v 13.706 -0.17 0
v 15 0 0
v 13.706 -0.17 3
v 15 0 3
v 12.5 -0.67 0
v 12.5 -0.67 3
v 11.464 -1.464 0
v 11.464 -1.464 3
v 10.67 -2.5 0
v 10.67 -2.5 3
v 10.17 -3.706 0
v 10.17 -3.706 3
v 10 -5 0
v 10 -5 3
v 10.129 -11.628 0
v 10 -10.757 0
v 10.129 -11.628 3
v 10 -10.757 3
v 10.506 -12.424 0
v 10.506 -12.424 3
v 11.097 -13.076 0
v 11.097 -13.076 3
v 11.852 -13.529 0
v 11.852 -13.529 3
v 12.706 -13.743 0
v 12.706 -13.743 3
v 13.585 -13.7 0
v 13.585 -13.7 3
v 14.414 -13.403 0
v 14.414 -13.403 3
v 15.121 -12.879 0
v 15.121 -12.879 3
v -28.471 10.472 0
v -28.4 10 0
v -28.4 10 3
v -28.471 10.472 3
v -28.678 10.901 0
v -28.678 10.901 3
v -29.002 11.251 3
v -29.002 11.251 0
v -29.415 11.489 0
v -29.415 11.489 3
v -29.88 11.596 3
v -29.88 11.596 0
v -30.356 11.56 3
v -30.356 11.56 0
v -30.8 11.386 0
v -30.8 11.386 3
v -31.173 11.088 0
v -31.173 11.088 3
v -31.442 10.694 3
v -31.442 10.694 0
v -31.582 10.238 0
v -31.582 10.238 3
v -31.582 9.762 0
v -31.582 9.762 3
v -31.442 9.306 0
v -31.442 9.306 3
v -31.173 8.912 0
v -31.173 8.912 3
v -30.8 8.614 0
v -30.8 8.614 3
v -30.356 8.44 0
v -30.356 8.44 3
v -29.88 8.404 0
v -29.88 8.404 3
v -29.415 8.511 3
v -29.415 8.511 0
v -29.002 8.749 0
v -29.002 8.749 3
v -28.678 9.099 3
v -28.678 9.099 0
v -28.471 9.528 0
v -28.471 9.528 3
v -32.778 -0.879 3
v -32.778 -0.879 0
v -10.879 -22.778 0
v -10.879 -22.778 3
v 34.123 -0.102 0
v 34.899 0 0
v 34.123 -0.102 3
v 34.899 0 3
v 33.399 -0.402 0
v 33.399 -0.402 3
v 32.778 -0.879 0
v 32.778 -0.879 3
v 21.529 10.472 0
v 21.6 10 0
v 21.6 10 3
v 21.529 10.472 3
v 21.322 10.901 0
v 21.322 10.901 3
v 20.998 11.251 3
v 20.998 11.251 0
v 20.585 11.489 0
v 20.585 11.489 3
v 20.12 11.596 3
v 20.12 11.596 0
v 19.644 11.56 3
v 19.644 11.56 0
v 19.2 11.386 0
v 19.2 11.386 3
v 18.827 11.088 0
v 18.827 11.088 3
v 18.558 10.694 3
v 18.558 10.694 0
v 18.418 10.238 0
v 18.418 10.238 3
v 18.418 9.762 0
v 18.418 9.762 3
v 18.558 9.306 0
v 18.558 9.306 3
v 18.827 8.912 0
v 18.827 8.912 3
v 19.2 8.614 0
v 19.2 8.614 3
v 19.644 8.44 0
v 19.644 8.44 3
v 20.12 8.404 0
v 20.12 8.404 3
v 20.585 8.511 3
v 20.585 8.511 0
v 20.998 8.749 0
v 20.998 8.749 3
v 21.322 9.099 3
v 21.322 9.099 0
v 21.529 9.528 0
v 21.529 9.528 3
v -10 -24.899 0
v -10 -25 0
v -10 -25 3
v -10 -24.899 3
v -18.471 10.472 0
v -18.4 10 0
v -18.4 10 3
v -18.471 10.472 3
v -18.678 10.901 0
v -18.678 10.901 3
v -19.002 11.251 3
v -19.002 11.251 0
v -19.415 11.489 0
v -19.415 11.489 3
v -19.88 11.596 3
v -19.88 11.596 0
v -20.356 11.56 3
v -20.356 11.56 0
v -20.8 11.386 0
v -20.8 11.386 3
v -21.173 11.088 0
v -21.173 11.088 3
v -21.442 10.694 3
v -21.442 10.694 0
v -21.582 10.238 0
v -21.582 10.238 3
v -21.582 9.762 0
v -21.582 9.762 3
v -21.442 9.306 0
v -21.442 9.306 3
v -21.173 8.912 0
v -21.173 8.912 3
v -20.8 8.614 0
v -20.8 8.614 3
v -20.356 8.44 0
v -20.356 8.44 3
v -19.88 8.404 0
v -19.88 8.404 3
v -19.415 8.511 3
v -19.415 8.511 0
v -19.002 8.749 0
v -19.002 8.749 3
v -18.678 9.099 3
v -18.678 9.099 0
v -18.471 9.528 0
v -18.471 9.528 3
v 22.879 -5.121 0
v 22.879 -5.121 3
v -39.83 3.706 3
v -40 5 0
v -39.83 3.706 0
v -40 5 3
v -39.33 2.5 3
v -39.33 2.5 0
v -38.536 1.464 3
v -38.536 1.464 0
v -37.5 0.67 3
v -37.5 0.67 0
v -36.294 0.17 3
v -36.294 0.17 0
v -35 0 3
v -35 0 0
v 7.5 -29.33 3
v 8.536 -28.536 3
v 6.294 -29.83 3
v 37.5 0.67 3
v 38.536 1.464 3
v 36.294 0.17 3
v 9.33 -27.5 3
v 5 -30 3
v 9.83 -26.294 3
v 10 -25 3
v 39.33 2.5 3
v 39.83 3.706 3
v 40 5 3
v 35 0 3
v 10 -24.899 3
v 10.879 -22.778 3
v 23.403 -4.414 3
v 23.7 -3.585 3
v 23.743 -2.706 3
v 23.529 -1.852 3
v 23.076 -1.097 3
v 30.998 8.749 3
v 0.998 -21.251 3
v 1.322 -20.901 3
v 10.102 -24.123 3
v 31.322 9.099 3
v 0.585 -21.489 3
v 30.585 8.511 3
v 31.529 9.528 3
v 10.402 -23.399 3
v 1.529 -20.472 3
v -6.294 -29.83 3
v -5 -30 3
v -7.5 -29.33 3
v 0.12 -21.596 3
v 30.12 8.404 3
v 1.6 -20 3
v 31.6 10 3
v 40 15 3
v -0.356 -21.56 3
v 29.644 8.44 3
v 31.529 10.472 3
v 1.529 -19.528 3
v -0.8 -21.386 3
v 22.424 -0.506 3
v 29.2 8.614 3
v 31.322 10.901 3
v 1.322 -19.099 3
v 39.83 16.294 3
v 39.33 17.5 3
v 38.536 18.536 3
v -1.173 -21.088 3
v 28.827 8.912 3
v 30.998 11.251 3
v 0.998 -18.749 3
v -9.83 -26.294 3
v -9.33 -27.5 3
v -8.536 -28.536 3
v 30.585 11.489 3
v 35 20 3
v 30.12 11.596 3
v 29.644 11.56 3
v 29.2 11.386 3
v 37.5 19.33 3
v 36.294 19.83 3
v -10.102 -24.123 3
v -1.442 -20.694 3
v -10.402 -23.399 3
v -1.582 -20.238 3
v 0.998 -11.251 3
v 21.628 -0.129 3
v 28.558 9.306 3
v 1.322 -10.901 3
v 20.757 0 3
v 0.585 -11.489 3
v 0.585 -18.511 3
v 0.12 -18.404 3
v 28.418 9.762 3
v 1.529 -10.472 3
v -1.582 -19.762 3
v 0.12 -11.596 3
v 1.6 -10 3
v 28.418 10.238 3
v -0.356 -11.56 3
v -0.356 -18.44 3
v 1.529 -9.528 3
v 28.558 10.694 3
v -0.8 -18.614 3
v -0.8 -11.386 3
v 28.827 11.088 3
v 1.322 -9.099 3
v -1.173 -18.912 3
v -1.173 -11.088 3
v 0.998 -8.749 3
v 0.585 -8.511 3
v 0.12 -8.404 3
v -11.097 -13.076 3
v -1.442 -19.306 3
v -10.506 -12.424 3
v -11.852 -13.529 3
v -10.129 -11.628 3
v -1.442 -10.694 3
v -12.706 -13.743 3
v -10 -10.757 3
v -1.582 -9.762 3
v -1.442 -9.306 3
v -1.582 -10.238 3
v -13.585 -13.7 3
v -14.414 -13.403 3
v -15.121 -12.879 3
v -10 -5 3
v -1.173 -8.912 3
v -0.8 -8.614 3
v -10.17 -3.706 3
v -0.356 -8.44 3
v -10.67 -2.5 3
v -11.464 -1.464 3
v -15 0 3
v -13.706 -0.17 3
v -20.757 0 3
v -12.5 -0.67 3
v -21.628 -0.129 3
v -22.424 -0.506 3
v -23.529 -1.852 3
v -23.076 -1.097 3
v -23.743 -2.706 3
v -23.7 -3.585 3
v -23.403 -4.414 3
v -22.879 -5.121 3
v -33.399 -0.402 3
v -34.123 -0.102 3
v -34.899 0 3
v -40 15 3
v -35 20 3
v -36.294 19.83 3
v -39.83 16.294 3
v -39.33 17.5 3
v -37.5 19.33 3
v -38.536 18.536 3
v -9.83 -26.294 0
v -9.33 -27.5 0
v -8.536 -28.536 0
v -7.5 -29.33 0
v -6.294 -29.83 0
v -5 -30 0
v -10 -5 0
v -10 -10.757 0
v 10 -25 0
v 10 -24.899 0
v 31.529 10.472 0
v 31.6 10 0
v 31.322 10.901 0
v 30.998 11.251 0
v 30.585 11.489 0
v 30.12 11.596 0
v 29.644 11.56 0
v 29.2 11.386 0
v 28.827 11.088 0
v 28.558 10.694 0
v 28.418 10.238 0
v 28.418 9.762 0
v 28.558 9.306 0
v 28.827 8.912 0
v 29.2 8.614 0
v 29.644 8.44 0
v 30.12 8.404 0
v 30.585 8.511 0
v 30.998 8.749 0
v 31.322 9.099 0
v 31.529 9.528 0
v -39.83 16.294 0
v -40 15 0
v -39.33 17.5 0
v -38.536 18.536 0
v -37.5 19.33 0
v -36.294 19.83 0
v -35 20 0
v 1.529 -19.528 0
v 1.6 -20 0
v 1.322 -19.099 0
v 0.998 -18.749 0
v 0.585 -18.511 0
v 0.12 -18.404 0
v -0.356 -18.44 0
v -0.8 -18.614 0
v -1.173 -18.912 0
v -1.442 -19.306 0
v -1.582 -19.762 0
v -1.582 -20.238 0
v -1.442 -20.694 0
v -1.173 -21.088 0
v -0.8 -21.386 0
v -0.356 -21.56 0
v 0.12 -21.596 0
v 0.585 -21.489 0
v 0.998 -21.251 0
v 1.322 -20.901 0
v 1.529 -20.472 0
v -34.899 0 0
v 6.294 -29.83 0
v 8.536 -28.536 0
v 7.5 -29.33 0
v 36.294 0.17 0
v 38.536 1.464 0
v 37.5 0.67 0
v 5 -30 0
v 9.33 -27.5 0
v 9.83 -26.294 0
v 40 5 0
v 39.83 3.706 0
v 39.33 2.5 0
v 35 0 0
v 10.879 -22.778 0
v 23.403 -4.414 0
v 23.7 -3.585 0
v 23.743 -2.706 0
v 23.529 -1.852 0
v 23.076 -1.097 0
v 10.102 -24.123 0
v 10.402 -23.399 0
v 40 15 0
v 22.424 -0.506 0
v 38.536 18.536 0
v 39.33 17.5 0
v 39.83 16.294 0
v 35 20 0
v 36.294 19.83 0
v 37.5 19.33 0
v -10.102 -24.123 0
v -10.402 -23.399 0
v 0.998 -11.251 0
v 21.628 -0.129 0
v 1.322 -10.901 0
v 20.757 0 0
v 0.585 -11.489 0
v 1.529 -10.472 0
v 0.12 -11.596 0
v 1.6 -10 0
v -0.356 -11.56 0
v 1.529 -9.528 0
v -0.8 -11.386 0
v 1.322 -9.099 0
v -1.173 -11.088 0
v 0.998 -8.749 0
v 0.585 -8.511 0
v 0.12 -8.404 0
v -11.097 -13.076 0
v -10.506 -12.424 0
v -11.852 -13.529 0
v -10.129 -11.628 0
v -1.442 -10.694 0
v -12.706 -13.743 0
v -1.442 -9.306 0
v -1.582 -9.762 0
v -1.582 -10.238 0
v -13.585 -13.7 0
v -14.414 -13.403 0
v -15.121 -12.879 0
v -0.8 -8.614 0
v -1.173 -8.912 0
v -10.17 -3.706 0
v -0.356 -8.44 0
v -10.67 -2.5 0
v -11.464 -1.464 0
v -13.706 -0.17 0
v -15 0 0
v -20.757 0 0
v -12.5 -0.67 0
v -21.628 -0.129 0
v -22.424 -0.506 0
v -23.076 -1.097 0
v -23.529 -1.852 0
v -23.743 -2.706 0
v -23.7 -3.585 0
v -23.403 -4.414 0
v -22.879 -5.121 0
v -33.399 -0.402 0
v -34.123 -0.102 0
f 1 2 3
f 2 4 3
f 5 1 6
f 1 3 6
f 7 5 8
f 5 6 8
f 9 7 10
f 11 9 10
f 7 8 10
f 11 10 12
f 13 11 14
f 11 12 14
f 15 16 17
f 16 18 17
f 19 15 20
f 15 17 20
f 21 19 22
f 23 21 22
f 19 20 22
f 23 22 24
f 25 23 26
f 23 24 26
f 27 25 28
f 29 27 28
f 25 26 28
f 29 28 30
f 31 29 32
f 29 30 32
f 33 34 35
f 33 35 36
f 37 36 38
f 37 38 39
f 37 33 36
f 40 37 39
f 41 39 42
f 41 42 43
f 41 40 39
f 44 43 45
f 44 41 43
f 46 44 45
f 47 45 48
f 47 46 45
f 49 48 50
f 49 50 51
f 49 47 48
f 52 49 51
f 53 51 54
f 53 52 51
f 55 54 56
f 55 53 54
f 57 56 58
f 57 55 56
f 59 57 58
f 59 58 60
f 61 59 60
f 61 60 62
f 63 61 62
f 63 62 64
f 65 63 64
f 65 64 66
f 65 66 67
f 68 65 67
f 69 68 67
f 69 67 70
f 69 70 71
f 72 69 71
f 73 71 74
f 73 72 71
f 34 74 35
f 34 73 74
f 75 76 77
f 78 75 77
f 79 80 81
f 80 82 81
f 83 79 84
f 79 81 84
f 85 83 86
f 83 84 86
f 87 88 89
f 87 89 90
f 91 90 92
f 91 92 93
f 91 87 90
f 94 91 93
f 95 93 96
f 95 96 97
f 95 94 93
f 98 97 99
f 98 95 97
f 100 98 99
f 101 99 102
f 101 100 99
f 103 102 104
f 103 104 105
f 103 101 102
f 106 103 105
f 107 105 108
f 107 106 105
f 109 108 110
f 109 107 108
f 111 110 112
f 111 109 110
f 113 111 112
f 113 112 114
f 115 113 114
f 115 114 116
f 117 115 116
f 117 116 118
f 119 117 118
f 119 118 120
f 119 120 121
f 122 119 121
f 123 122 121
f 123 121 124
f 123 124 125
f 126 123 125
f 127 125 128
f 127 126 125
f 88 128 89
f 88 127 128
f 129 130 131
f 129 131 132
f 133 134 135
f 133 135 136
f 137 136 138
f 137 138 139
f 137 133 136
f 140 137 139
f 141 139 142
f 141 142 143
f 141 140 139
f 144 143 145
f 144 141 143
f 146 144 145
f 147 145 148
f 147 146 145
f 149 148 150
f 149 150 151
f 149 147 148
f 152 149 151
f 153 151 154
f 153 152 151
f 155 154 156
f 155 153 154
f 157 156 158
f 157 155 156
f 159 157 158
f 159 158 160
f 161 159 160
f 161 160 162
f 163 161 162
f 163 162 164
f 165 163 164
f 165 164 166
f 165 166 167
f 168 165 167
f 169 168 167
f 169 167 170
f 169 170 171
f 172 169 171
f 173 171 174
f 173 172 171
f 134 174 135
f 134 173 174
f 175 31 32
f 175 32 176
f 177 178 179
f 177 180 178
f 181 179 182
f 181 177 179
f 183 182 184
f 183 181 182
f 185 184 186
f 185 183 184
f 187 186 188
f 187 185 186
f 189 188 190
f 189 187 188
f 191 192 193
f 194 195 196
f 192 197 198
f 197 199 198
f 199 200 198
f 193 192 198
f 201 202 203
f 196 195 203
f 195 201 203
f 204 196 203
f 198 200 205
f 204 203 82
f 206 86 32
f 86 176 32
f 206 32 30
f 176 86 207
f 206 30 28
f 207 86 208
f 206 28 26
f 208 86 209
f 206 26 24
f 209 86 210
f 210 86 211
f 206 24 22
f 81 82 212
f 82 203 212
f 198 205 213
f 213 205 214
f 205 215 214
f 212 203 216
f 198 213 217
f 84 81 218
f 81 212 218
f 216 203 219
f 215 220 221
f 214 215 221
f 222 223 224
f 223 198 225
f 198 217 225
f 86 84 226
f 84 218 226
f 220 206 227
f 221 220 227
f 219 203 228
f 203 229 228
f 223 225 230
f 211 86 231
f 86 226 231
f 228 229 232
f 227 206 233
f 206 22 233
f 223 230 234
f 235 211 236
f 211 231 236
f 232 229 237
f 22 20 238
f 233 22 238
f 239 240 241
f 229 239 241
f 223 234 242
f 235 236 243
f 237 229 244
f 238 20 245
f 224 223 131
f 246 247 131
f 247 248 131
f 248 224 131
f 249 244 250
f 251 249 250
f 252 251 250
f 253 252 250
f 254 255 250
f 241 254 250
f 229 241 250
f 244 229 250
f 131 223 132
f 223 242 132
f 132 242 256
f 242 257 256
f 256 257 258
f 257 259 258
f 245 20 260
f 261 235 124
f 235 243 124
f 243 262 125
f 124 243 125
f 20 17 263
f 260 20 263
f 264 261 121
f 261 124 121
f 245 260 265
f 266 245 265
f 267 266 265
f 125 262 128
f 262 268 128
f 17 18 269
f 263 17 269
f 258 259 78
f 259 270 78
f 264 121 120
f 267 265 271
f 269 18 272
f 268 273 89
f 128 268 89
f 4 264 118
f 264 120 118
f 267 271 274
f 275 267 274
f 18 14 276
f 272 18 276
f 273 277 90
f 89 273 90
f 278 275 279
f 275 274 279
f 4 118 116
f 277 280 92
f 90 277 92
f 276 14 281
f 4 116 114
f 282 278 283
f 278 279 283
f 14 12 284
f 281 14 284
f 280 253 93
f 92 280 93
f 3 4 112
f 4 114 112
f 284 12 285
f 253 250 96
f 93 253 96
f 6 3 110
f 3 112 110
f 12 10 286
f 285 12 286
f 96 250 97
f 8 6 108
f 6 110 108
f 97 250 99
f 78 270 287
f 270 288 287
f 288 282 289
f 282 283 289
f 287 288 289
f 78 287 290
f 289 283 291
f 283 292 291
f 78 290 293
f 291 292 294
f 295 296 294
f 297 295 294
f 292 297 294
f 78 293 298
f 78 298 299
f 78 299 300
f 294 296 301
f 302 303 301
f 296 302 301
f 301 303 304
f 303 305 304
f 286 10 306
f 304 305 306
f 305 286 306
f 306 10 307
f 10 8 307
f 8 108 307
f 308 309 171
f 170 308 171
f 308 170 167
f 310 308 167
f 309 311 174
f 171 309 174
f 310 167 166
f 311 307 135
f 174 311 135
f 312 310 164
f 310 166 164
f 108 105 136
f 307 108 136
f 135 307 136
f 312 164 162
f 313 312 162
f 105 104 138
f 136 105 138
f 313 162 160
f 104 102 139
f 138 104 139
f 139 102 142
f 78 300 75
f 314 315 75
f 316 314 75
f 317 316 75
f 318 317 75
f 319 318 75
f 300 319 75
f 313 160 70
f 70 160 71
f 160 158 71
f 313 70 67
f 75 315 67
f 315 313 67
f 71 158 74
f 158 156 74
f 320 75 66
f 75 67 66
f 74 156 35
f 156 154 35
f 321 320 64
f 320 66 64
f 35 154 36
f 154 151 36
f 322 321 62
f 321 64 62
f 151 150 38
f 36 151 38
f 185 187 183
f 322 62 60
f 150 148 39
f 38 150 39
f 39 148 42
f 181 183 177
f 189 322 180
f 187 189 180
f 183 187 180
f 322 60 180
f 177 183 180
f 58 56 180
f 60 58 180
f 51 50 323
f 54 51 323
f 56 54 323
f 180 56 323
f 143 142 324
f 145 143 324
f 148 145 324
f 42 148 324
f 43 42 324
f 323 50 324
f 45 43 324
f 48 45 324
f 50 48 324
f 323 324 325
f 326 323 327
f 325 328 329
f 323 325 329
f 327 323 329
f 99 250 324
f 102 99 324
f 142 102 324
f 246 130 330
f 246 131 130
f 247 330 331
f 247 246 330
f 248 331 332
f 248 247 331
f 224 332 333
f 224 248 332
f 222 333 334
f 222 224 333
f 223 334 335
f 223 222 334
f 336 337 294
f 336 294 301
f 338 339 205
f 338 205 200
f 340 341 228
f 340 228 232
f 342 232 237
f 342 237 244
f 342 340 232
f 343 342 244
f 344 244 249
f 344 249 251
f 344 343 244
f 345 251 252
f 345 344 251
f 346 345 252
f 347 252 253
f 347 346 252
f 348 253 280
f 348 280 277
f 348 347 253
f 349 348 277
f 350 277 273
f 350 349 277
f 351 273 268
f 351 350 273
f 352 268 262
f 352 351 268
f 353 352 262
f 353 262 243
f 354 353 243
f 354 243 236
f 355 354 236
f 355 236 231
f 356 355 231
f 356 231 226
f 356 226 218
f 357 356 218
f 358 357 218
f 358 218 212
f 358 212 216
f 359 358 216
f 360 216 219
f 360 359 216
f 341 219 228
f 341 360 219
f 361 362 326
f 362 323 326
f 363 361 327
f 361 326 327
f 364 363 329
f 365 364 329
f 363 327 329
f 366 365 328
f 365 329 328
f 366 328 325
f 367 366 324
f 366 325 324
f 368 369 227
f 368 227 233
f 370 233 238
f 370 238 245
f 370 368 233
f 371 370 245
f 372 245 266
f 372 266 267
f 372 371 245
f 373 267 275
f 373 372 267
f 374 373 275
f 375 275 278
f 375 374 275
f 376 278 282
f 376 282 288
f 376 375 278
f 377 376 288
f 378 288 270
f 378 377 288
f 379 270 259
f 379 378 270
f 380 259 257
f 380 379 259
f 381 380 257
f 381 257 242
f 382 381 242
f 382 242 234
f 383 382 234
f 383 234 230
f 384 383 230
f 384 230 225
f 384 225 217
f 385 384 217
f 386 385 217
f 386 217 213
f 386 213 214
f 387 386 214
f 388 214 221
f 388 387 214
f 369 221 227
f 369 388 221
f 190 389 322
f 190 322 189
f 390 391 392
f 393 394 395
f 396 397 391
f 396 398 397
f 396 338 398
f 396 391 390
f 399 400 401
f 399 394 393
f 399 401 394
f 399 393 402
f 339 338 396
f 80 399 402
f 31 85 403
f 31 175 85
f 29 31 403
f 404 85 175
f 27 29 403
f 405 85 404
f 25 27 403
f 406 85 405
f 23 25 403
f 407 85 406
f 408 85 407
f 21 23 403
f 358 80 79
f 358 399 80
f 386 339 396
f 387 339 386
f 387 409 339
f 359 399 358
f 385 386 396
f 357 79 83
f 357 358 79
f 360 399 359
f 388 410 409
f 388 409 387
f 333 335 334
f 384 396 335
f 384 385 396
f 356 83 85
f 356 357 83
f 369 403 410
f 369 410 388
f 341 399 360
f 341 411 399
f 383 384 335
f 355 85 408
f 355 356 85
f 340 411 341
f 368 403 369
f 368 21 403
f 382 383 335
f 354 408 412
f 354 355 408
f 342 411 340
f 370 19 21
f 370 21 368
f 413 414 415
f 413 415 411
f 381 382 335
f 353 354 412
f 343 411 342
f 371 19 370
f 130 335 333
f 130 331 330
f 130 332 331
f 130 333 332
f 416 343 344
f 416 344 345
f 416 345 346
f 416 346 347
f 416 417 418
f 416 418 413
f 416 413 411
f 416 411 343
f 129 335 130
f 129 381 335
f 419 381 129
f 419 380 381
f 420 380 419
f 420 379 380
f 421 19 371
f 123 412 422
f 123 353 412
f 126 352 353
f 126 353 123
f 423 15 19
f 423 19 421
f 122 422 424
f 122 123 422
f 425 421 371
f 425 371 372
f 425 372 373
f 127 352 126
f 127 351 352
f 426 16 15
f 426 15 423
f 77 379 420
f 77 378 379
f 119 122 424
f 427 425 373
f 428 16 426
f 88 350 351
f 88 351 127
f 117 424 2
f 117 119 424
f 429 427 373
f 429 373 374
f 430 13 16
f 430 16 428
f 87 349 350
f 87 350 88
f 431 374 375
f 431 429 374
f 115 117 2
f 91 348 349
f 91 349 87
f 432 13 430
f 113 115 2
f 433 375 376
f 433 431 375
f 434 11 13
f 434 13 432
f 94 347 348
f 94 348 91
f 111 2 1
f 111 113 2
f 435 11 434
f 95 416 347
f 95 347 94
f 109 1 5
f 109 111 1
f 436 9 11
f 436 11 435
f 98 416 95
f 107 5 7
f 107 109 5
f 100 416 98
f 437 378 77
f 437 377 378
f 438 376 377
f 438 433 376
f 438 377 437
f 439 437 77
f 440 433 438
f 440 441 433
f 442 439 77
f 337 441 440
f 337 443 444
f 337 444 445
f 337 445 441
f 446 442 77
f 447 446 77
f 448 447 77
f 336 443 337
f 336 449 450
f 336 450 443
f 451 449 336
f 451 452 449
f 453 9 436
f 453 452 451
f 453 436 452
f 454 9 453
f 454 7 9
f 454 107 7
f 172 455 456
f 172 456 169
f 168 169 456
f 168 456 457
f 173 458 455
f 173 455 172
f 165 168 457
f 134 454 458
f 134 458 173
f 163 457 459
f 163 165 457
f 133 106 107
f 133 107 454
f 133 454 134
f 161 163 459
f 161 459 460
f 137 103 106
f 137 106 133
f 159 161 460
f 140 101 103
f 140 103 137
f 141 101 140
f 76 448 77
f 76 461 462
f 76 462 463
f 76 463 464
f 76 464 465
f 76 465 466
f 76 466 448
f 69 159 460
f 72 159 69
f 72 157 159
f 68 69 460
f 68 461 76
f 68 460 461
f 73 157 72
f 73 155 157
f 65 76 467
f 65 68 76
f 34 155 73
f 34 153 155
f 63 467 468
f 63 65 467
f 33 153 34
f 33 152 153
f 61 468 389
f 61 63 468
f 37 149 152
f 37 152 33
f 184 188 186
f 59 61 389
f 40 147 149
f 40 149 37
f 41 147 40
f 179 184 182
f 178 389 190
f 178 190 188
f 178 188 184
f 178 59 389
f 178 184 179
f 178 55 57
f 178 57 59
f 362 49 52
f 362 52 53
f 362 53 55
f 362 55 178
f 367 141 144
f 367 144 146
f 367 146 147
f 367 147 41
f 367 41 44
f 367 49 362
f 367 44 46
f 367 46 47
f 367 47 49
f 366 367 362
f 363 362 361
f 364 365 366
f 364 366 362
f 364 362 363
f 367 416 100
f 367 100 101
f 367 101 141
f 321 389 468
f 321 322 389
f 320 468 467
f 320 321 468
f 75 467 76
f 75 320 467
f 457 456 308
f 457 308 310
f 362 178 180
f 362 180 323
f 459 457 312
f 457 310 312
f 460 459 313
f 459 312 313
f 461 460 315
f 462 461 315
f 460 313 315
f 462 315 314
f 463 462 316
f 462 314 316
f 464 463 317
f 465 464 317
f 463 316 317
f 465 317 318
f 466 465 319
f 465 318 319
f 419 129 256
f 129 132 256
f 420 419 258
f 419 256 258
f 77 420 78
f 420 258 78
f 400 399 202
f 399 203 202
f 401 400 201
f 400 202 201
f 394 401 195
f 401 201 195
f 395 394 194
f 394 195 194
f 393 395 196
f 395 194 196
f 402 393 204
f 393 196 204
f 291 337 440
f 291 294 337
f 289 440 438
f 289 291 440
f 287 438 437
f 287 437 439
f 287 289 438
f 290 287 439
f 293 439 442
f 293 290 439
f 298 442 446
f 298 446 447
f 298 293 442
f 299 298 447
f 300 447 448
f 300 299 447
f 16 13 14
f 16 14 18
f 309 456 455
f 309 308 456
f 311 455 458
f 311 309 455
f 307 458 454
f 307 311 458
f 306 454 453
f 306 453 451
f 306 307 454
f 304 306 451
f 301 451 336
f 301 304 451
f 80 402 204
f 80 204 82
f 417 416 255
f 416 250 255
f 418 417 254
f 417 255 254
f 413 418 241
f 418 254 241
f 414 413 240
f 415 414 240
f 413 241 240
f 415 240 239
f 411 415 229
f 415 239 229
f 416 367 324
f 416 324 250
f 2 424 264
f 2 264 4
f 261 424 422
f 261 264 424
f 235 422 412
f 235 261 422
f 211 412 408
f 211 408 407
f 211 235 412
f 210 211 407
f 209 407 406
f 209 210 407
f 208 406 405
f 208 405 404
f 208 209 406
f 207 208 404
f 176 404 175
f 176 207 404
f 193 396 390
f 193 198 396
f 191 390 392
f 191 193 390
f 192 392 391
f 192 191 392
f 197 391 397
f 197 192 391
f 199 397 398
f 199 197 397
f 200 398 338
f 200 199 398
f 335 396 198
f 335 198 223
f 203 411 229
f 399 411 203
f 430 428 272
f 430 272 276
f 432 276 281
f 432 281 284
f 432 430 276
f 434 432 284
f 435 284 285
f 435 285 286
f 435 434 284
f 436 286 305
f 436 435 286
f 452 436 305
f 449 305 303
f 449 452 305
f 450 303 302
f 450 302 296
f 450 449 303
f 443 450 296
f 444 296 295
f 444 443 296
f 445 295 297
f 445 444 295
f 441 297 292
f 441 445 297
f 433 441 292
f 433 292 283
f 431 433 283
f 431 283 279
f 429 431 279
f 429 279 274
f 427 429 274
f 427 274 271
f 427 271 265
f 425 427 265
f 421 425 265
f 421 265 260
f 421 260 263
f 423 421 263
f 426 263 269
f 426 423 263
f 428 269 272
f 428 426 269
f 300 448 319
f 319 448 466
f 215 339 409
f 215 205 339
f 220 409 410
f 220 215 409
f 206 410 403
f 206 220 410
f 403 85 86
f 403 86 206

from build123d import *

# Parameters (mm, degrees)
SKETCH_1_R      = 1.6
EXTRUDE_1_DEPTH = 3
FILLET_1_R      = 5
EXTRUDE_2_DEPTH = 3
FILLET_2_R      = 3


with BuildPart() as part:
    # 草图1 → 凸台-拉伸1 (new body)
    with BuildSketch(Plane.XY):
        Polygon((-40, 0), (-40, 20), (40, 20), (40, 0), (10, 0), (10, -30), (-10, -30), (-10, 0), align=None)
        with Locations((-30, 10)):
            Circle(SKETCH_1_R, mode=Mode.SUBTRACT)
        with Locations((-20, 10)):
            Circle(SKETCH_1_R, mode=Mode.SUBTRACT)
        with Locations((0, -10)):
            Circle(SKETCH_1_R, mode=Mode.SUBTRACT)
        with Locations((0, -20)):
            Circle(SKETCH_1_R, mode=Mode.SUBTRACT)
        with Locations((20, 10)):
            Circle(SKETCH_1_R, mode=Mode.SUBTRACT)
        with Locations((30, 10)):
            Circle(SKETCH_1_R, mode=Mode.SUBTRACT)
    extrude(amount=EXTRUDE_1_DEPTH)

    # 圆角1
    fillet_1_edges = [part.edges().sort_by_distance(p)[0] for p in [
        (-40, 0, 1.5),
        (-40, 20, 1.5),
        (40, 20, 1.5),
        (40, 0, 1.5),
        (10, 0, 1.5),
        (10, -30, 1.5),
        (-10, -30, 1.5),
        (-10, 0, 1.5),
    ]]
    fillet(fillet_1_edges, radius=FILLET_1_R)

    # 草图2 → 凸台-拉伸2 (add)
    with BuildSketch(Plane(origin=(0, 0, 0), x_dir=(-1, 0, 0), z_dir=(0, 0, -1))):
        Polygon((-33.656854249, 0), (-10, -23.656854249), (-10, -18), (-28, 0), align=None)
        Polygon((10, -18), (28, 0), (33.656854249, 0), (10, -23.656854249), align=None)
    extrude(amount=-EXTRUDE_2_DEPTH)

    # 圆角2
    fillet_2_edges = [part.edges().sort_by_distance(p)[0] for p in [
        (33.656854249, 0, 1.5),
        (28, 0, 1.5),
        (10, -18, 1.5),
        (10, -23.656854249, 1.5),
        (-10, -23.656854249, 1.5),
        (-10, -18, 1.5),
        (-28, 0, 1.5),
        (-33.656854249, 0, 1.5),
    ]]
    fillet(fillet_2_edges, radius=FILLET_2_R)


solid = part.part
